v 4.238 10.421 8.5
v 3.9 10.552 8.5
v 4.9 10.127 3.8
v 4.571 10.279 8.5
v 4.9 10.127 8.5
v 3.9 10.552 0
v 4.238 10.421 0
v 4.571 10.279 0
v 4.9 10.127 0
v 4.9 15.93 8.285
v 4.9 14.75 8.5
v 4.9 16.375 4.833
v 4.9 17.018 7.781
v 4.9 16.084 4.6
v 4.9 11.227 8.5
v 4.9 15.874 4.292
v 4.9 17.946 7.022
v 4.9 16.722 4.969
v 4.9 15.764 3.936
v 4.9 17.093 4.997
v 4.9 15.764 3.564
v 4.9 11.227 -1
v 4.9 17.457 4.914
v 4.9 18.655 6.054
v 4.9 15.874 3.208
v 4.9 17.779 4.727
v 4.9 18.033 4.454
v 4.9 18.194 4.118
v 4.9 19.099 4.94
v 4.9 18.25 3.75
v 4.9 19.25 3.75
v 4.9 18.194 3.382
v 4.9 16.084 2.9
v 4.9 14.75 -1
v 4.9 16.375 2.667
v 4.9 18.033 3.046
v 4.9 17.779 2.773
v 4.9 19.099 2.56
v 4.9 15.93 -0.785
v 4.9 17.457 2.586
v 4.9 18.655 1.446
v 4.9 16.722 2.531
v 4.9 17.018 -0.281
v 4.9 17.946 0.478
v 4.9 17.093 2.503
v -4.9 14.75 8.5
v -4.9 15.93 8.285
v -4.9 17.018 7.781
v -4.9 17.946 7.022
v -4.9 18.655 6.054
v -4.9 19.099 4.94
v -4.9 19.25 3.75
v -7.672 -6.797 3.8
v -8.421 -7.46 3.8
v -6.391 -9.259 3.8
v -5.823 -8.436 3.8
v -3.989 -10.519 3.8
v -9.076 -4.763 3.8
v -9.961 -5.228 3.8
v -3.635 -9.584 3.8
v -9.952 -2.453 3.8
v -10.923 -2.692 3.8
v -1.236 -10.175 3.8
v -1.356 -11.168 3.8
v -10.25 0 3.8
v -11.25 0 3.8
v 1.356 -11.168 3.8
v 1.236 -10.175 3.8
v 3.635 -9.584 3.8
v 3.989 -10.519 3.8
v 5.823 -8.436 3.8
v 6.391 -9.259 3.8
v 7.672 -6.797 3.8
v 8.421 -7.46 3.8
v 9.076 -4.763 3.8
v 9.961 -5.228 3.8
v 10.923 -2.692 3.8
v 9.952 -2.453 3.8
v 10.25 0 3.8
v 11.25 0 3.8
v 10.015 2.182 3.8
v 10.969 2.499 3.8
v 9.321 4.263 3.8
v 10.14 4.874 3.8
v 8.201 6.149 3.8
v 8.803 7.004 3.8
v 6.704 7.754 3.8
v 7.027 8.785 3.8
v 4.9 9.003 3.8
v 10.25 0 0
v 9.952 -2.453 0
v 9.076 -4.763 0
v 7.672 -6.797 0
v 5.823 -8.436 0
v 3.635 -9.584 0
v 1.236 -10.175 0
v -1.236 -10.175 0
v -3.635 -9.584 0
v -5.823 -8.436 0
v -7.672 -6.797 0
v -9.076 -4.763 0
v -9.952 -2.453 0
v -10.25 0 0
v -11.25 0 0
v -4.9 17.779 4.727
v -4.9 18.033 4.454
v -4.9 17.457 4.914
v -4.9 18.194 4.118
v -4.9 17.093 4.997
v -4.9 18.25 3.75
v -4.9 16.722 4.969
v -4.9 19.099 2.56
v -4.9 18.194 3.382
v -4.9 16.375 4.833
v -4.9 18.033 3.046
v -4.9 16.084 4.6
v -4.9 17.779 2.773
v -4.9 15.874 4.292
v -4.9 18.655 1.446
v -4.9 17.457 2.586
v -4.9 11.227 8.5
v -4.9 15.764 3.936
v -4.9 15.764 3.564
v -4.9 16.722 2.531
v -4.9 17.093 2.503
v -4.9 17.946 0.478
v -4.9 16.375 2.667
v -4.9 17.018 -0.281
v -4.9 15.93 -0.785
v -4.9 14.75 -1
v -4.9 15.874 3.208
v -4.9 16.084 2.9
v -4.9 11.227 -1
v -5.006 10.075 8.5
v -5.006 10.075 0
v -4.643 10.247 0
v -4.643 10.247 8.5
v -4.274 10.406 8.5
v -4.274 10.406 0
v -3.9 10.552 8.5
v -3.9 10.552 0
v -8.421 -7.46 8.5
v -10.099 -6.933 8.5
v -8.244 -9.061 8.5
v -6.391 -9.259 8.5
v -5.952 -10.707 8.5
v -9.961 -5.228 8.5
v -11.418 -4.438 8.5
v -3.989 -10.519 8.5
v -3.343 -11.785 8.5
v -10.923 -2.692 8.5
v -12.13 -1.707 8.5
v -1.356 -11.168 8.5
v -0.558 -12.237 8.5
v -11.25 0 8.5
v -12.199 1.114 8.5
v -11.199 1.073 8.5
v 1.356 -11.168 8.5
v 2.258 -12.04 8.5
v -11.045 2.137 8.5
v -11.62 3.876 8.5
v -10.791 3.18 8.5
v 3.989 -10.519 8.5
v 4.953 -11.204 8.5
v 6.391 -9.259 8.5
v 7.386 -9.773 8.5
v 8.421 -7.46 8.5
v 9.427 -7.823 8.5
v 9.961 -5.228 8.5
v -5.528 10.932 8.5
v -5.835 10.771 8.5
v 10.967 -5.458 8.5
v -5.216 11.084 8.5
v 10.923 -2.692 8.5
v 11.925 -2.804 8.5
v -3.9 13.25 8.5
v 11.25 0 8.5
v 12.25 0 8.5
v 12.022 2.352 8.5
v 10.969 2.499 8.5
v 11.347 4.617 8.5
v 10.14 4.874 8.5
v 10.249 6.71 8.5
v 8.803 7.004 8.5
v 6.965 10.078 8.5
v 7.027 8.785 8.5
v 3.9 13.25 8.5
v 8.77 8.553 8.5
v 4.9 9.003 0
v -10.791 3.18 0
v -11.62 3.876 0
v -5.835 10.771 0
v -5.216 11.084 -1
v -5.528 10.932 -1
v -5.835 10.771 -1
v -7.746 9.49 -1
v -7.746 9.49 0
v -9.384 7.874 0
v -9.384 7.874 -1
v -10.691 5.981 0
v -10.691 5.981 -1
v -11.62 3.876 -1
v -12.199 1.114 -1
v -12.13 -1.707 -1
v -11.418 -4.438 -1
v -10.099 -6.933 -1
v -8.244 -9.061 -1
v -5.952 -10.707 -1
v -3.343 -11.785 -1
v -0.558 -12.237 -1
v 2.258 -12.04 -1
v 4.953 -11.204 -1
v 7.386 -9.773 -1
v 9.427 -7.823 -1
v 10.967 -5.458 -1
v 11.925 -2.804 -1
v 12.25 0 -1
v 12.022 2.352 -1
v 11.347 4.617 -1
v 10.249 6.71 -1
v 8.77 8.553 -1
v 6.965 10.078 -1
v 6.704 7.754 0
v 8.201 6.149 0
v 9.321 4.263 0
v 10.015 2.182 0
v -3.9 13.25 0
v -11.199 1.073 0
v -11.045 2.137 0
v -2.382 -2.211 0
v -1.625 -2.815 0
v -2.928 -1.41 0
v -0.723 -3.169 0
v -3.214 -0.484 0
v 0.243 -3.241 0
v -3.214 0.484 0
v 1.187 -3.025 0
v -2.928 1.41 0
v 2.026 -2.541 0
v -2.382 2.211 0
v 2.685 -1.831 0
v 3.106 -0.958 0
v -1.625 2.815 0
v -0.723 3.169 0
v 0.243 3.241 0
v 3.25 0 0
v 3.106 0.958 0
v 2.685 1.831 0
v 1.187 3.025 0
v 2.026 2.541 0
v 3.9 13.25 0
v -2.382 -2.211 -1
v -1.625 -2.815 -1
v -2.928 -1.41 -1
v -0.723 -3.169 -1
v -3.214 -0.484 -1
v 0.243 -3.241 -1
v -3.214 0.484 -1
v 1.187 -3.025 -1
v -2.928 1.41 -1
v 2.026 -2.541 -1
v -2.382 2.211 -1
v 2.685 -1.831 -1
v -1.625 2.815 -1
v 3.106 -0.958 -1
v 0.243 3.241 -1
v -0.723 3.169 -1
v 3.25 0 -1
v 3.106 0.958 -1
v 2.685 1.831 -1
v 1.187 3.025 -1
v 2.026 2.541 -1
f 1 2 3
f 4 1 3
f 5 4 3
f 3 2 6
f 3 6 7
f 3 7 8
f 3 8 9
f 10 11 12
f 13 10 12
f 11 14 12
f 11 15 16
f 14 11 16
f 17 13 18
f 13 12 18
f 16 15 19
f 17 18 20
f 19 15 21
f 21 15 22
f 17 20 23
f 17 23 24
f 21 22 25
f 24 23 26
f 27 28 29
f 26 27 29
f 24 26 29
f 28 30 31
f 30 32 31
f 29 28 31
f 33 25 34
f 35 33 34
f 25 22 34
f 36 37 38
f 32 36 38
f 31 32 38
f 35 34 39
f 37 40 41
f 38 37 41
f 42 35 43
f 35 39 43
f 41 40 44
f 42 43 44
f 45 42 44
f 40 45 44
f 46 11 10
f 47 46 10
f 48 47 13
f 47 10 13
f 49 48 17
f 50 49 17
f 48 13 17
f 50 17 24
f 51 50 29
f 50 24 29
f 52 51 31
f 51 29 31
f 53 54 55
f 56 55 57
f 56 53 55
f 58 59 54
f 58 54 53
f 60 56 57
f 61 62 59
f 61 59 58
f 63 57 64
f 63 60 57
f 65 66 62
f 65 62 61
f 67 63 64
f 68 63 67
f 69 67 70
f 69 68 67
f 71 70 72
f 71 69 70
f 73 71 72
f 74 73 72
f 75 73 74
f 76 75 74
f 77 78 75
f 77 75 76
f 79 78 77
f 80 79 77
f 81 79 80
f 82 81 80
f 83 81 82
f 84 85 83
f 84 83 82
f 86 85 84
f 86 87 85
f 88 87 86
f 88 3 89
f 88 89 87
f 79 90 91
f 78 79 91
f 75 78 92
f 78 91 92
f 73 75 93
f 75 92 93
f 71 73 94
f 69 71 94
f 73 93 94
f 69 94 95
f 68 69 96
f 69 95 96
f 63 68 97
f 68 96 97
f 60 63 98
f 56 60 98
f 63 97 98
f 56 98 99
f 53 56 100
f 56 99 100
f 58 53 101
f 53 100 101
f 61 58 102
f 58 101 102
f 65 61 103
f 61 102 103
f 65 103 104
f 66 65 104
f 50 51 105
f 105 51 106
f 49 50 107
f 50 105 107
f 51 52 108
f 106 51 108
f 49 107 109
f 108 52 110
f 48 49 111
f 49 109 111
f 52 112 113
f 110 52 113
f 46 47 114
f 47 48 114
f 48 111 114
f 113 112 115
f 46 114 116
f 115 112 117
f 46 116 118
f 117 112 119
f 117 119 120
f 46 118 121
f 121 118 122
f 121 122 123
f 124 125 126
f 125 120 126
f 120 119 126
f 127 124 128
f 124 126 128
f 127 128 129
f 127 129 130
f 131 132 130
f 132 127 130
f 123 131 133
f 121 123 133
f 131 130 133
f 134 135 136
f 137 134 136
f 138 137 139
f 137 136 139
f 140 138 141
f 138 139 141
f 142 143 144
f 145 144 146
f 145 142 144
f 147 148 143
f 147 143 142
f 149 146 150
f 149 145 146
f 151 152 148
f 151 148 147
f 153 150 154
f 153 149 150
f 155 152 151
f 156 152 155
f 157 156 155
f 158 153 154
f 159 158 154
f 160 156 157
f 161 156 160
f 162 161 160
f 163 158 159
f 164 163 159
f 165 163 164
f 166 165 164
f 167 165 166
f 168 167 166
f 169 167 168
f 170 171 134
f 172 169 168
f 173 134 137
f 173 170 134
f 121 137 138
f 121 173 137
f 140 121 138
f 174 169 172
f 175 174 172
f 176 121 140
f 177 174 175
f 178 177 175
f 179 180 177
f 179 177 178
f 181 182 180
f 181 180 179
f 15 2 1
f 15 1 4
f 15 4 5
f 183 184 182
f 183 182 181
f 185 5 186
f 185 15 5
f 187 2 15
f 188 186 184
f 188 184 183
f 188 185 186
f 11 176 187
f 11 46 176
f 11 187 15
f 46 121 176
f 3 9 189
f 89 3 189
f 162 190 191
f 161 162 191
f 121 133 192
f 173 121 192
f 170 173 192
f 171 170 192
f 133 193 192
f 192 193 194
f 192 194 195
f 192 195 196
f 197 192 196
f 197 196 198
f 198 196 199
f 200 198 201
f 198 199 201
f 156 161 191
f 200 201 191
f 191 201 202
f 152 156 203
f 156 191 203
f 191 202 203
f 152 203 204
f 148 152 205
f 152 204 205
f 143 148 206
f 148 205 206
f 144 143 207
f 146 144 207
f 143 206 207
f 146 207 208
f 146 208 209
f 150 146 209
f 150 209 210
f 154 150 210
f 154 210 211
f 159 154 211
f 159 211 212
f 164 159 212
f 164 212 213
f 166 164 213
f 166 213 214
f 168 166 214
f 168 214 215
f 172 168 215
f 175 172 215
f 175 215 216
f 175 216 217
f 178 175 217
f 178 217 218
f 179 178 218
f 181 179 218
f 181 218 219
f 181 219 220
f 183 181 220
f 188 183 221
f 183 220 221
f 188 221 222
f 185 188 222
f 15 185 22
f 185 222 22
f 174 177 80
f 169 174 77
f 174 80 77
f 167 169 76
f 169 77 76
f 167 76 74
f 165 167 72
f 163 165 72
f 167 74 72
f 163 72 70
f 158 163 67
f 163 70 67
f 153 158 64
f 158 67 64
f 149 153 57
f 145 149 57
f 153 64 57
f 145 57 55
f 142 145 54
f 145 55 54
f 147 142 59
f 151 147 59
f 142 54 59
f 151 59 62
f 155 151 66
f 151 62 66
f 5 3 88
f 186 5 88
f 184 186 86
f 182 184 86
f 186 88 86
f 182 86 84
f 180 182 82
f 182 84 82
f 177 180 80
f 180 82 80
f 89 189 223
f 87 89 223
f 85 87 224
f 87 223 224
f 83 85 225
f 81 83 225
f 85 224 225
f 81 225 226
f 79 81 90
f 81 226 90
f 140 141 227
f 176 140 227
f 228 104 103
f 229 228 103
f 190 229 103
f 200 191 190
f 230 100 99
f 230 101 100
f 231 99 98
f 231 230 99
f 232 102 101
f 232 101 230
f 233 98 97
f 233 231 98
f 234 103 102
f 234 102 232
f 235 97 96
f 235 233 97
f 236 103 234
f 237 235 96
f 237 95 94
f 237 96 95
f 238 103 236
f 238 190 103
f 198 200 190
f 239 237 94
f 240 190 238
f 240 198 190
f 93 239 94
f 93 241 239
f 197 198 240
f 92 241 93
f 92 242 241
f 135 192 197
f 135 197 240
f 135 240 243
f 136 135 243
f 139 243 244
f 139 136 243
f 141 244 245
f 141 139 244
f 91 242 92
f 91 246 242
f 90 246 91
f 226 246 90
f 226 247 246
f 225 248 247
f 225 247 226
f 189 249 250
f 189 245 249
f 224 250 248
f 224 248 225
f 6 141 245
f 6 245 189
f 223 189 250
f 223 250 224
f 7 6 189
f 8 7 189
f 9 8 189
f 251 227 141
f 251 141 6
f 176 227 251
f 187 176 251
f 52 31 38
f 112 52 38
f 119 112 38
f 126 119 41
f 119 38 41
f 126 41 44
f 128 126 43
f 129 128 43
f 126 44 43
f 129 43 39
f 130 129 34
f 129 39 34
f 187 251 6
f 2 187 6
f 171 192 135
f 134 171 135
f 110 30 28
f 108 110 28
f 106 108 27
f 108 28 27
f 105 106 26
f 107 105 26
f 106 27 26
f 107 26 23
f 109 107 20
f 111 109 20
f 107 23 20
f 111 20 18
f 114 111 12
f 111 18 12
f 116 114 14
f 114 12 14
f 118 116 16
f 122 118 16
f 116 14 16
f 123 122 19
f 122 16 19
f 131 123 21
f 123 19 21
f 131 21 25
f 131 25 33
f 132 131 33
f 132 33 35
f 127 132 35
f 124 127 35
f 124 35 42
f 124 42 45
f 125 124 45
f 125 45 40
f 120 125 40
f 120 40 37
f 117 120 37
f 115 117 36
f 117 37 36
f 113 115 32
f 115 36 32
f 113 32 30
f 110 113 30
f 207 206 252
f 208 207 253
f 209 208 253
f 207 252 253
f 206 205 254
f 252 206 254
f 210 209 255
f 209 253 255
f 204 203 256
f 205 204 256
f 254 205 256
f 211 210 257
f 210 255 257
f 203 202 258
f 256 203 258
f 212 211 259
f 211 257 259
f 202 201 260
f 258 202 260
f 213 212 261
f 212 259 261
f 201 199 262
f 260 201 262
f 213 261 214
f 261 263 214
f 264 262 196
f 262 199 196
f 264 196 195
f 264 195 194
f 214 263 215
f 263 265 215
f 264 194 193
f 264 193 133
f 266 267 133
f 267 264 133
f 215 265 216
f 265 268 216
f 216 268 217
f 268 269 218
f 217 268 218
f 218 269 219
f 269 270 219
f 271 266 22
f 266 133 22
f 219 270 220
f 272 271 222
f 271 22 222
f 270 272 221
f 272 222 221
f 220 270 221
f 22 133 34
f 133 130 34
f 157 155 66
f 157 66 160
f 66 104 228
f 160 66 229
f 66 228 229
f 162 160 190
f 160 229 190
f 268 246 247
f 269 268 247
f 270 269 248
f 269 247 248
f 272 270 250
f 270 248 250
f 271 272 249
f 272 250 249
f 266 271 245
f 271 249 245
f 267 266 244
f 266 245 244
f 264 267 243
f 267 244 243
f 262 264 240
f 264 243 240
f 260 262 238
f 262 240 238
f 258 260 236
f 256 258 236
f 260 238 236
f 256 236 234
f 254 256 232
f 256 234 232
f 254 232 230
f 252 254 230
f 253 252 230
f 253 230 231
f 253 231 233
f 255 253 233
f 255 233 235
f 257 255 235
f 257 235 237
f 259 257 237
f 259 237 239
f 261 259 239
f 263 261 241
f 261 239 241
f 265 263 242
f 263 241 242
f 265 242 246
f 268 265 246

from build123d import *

# Parameters (mm, degrees)
F0_R     = 3.25
F1_DEPTH = 1
F2_DEPTH = 8.5
F3_DEPTH = 3.8
F4_R     = 1.25
F5_DEPTH = 9.8


with BuildPart() as f1:
    # F0 (on Top) → F1 (new body)
    with BuildSketch(Plane.XY):
        with BuildLine():
            ThreePointArc((-3.9, 10.5523694022), (0, 11.25), (3.9, 10.5523694022))
            Line((3.9, 10.5523694022), (3.9, 11.6126009145))
            ThreePointArc((3.9, 11.6126009145), (0, 12.25), (-3.9, 11.6126009145))
            Line((-3.9, 11.6126009145), (-3.9, 10.5523694022))
        make_face()
        with BuildLine():
            ThreePointArc((-3.9, 11.6126009145), (0, 12.25), (3.9, 11.6126009145))
            Line((3.9, 11.6126009145), (3.9, 13.25))
            Line((3.9, 13.25), (-3.9, 13.25))
            Line((-3.9, 13.25), (-3.9, 11.6126009145))
        make_face()
        with BuildLine():
            ThreePointArc((-5.0059832106, 10.0748514677), (-4.4593878595, 10.3284248518), (-3.9, 10.5523694022))
            Line((-3.9, 10.5523694022), (-3.9, 11.6126009145))
            ThreePointArc((-3.9, 11.6126009145), (-4.4042152746, 11.4308961947), (-4.9, 11.2273104526))
            ThreePointArc((-4.9, 11.2273104526), (-5.3725531584, 11.0090041584), (-5.835405231, 10.7708191791))
            Line((-5.835405231, 10.7708191791), (-5.0059832106, 10.0748514677))
        make_face()
        with BuildLine():
            Line((3.9, 13.25), (3.9, 11.6126009145))
            ThreePointArc((3.9, 11.6126009145), (4.4042152746, 11.4308961947), (4.9, 11.2273104526))
            Line((4.9, 11.2273104526), (4.9, 19.25))
            Line((4.9, 19.25), (-4.9, 19.25))
            Line((-4.9, 19.25), (-4.9, 11.2273104526))
            ThreePointArc((-4.9, 11.2273104526), (-4.4042152746, 11.4308961947), (-3.9, 11.6126009145))
            Line((-3.9, 11.6126009145), (-3.9, 13.25))
            Line((-3.9, 13.25), (3.9, 13.25))
        make_face()
        with BuildLine():
            ThreePointArc((4.9, 10.1268208239), (9.5311987704, 5.9765165439), (11.25, 0))
            ThreePointArc((11.25, 0), (0, -11.25), (-11.25, 0))
            ThreePointArc((-11.25, 0), (-11.1346768386, 1.6066958954), (-10.7910716977, 3.1804514796))
            Line((-10.7910716977, 3.1804514796), (-11.6204937182, 3.8764191911))
            ThreePointArc((-11.6204937182, 3.8764191911), (-1.9636002587, -12.0915993162), (12.25, 0))
            ThreePointArc((12.25, 0), (10.249085325, 6.7096013294), (4.9, 11.2273104526))
            ThreePointArc((4.9, 11.2273104526), (4.4042152746, 11.4308961947), (3.9, 11.6126009145))
            Line((3.9, 11.6126009145), (3.9, 10.5523694022))
            ThreePointArc((3.9, 10.5523694022), (4.4051416434, 10.3516775018), (4.9, 10.1268208239))
        make_face()
        with BuildLine():
            Line((-11.6204937182, 3.8764191911), (-10.7910716977, 3.1804514796))
            ThreePointArc((-10.7910716977, 3.1804514796), (-8.6179999851, 7.231360609), (-5.0059832106, 10.0748514677))
            Line((-5.0059832106, 10.0748514677), (-5.835405231, 10.7708191791))
            ThreePointArc((-5.835405231, 10.7708191791), (-9.3840444282, 7.8741482187), (-11.6204937182, 3.8764191911))
        make_face()
        with BuildLine():
            ThreePointArc((10.25, 0), (8.8115690998, 5.2362916267), (4.9, 9.0029161942))
            ThreePointArc((4.9, 9.0029161942), (-5.2362916267, 8.8115690998), (-10.25, 0))
            ThreePointArc((-10.25, 0), (0, -10.25), (10.25, 0))
        make_face()
        Circle(F0_R, mode=Mode.SUBTRACT)
        with BuildLine():
            Line((4.9, 9.0029161942), (4.9, 10.1268208239))
            ThreePointArc((4.9, 10.1268208239), (4.4051416434, 10.3516775018), (3.9, 10.5523694022))
            ThreePointArc((3.9, 10.5523694022), (0, 11.25), (-3.9, 10.5523694022))
            ThreePointArc((-3.9, 10.5523694022), (-4.4593878595, 10.3284248518), (-5.0059832106, 10.0748514677))
            ThreePointArc((-5.0059832106, 10.0748514677), (-8.6179999851, 7.231360609), (-10.7910716977, 3.1804514796))
            ThreePointArc((-10.7910716977, 3.1804514796), (-11.1346768386, 1.6066958954), (-11.25, 0))
            Line((-11.25, 0), (-10.25, 0))
            ThreePointArc((-10.25, 0), (-5.2362916267, 8.8115690998), (4.9, 9.0029161942))
        make_face()
        with BuildLine():
            ThreePointArc((-11.25, 0), (0, -11.25), (11.25, 0))
            ThreePointArc((11.25, 0), (9.5311987704, 5.9765165439), (4.9, 10.1268208239))
            Line((4.9, 10.1268208239), (4.9, 9.0029161942))
            ThreePointArc((4.9, 9.0029161942), (8.8115690998, 5.2362916267), (10.25, 0))
            ThreePointArc((10.25, 0), (0, -10.25), (-10.25, 0))
            Line((-10.25, 0), (-11.25, 0))
        make_face()
    extrude(amount=-F1_DEPTH)

    # F0 (on Top) → F2 (join)
    with BuildSketch(Plane.XY):
        with BuildLine():
            ThreePointArc((-5.0059832106, 10.0748514677), (-4.4593878595, 10.3284248518), (-3.9, 10.5523694022))
            Line((-3.9, 10.5523694022), (-3.9, 11.6126009145))
            ThreePointArc((-3.9, 11.6126009145), (-4.4042152746, 11.4308961947), (-4.9, 11.2273104526))
            ThreePointArc((-4.9, 11.2273104526), (-5.3725531584, 11.0090041584), (-5.835405231, 10.7708191791))
            Line((-5.835405231, 10.7708191791), (-5.0059832106, 10.0748514677))
        make_face()
        with BuildLine():
            Line((3.9, 13.25), (3.9, 11.6126009145))
            ThreePointArc((3.9, 11.6126009145), (4.4042152746, 11.4308961947), (4.9, 11.2273104526))
            Line((4.9, 11.2273104526), (4.9, 19.25))
            Line((4.9, 19.25), (-4.9, 19.25))
            Line((-4.9, 19.25), (-4.9, 11.2273104526))
            ThreePointArc((-4.9, 11.2273104526), (-4.4042152746, 11.4308961947), (-3.9, 11.6126009145))
            Line((-3.9, 11.6126009145), (-3.9, 13.25))
            Line((-3.9, 13.25), (3.9, 13.25))
        make_face()
        with BuildLine():
            ThreePointArc((4.9, 10.1268208239), (9.5311987704, 5.9765165439), (11.25, 0))
            ThreePointArc((11.25, 0), (0, -11.25), (-11.25, 0))
            ThreePointArc((-11.25, 0), (-11.1346768386, 1.6066958954), (-10.7910716977, 3.1804514796))
            Line((-10.7910716977, 3.1804514796), (-11.6204937182, 3.8764191911))
            ThreePointArc((-11.6204937182, 3.8764191911), (-1.9636002587, -12.0915993162), (12.25, 0))
            ThreePointArc((12.25, 0), (10.249085325, 6.7096013294), (4.9, 11.2273104526))
            ThreePointArc((4.9, 11.2273104526), (4.4042152746, 11.4308961947), (3.9, 11.6126009145))
            Line((3.9, 11.6126009145), (3.9, 10.5523694022))
            ThreePointArc((3.9, 10.5523694022), (4.4051416434, 10.3516775018), (4.9, 10.1268208239))
        make_face()
    extrude(amount=F2_DEPTH)

    # F0 (on Top) → F3 (join)
    with BuildSketch(Plane.XY):
        with BuildLine():
            ThreePointArc((-11.25, 0), (0, -11.25), (11.25, 0))
            ThreePointArc((11.25, 0), (9.5311987704, 5.9765165439), (4.9, 10.1268208239))
            Line((4.9, 10.1268208239), (4.9, 9.0029161942))
            ThreePointArc((4.9, 9.0029161942), (8.8115690998, 5.2362916267), (10.25, 0))
            ThreePointArc((10.25, 0), (0, -10.25), (-10.25, 0))
            Line((-10.25, 0), (-11.25, 0))
        make_face()
    extrude(amount=F3_DEPTH)

    # F4 (on face) → F5 (cut, through all)
    with BuildSketch(Plane.YZ.offset(4.9)):
        with BuildLine():
            ThreePointArc((14.75, 8.5), (17.9463721422, 7.0215630821), (19.25, 3.75))
            Line((19.25, 3.75), (19.25, 8.5))
            Line((19.25, 8.5), (14.75, 8.5))
        make_face()
        with BuildLine():
            ThreePointArc((19.25, 3.75), (17.9463721422, 0.4784369179), (14.75, -1))
            Line((14.75, -1), (19.25, -1))
            Line((19.25, -1), (19.25, 3.75))
        make_face()
        with Locations((17, 3.75)):
            Circle(F4_R)
    extrude(amount=-F5_DEPTH, mode=Mode.SUBTRACT)


solid = f1.part
